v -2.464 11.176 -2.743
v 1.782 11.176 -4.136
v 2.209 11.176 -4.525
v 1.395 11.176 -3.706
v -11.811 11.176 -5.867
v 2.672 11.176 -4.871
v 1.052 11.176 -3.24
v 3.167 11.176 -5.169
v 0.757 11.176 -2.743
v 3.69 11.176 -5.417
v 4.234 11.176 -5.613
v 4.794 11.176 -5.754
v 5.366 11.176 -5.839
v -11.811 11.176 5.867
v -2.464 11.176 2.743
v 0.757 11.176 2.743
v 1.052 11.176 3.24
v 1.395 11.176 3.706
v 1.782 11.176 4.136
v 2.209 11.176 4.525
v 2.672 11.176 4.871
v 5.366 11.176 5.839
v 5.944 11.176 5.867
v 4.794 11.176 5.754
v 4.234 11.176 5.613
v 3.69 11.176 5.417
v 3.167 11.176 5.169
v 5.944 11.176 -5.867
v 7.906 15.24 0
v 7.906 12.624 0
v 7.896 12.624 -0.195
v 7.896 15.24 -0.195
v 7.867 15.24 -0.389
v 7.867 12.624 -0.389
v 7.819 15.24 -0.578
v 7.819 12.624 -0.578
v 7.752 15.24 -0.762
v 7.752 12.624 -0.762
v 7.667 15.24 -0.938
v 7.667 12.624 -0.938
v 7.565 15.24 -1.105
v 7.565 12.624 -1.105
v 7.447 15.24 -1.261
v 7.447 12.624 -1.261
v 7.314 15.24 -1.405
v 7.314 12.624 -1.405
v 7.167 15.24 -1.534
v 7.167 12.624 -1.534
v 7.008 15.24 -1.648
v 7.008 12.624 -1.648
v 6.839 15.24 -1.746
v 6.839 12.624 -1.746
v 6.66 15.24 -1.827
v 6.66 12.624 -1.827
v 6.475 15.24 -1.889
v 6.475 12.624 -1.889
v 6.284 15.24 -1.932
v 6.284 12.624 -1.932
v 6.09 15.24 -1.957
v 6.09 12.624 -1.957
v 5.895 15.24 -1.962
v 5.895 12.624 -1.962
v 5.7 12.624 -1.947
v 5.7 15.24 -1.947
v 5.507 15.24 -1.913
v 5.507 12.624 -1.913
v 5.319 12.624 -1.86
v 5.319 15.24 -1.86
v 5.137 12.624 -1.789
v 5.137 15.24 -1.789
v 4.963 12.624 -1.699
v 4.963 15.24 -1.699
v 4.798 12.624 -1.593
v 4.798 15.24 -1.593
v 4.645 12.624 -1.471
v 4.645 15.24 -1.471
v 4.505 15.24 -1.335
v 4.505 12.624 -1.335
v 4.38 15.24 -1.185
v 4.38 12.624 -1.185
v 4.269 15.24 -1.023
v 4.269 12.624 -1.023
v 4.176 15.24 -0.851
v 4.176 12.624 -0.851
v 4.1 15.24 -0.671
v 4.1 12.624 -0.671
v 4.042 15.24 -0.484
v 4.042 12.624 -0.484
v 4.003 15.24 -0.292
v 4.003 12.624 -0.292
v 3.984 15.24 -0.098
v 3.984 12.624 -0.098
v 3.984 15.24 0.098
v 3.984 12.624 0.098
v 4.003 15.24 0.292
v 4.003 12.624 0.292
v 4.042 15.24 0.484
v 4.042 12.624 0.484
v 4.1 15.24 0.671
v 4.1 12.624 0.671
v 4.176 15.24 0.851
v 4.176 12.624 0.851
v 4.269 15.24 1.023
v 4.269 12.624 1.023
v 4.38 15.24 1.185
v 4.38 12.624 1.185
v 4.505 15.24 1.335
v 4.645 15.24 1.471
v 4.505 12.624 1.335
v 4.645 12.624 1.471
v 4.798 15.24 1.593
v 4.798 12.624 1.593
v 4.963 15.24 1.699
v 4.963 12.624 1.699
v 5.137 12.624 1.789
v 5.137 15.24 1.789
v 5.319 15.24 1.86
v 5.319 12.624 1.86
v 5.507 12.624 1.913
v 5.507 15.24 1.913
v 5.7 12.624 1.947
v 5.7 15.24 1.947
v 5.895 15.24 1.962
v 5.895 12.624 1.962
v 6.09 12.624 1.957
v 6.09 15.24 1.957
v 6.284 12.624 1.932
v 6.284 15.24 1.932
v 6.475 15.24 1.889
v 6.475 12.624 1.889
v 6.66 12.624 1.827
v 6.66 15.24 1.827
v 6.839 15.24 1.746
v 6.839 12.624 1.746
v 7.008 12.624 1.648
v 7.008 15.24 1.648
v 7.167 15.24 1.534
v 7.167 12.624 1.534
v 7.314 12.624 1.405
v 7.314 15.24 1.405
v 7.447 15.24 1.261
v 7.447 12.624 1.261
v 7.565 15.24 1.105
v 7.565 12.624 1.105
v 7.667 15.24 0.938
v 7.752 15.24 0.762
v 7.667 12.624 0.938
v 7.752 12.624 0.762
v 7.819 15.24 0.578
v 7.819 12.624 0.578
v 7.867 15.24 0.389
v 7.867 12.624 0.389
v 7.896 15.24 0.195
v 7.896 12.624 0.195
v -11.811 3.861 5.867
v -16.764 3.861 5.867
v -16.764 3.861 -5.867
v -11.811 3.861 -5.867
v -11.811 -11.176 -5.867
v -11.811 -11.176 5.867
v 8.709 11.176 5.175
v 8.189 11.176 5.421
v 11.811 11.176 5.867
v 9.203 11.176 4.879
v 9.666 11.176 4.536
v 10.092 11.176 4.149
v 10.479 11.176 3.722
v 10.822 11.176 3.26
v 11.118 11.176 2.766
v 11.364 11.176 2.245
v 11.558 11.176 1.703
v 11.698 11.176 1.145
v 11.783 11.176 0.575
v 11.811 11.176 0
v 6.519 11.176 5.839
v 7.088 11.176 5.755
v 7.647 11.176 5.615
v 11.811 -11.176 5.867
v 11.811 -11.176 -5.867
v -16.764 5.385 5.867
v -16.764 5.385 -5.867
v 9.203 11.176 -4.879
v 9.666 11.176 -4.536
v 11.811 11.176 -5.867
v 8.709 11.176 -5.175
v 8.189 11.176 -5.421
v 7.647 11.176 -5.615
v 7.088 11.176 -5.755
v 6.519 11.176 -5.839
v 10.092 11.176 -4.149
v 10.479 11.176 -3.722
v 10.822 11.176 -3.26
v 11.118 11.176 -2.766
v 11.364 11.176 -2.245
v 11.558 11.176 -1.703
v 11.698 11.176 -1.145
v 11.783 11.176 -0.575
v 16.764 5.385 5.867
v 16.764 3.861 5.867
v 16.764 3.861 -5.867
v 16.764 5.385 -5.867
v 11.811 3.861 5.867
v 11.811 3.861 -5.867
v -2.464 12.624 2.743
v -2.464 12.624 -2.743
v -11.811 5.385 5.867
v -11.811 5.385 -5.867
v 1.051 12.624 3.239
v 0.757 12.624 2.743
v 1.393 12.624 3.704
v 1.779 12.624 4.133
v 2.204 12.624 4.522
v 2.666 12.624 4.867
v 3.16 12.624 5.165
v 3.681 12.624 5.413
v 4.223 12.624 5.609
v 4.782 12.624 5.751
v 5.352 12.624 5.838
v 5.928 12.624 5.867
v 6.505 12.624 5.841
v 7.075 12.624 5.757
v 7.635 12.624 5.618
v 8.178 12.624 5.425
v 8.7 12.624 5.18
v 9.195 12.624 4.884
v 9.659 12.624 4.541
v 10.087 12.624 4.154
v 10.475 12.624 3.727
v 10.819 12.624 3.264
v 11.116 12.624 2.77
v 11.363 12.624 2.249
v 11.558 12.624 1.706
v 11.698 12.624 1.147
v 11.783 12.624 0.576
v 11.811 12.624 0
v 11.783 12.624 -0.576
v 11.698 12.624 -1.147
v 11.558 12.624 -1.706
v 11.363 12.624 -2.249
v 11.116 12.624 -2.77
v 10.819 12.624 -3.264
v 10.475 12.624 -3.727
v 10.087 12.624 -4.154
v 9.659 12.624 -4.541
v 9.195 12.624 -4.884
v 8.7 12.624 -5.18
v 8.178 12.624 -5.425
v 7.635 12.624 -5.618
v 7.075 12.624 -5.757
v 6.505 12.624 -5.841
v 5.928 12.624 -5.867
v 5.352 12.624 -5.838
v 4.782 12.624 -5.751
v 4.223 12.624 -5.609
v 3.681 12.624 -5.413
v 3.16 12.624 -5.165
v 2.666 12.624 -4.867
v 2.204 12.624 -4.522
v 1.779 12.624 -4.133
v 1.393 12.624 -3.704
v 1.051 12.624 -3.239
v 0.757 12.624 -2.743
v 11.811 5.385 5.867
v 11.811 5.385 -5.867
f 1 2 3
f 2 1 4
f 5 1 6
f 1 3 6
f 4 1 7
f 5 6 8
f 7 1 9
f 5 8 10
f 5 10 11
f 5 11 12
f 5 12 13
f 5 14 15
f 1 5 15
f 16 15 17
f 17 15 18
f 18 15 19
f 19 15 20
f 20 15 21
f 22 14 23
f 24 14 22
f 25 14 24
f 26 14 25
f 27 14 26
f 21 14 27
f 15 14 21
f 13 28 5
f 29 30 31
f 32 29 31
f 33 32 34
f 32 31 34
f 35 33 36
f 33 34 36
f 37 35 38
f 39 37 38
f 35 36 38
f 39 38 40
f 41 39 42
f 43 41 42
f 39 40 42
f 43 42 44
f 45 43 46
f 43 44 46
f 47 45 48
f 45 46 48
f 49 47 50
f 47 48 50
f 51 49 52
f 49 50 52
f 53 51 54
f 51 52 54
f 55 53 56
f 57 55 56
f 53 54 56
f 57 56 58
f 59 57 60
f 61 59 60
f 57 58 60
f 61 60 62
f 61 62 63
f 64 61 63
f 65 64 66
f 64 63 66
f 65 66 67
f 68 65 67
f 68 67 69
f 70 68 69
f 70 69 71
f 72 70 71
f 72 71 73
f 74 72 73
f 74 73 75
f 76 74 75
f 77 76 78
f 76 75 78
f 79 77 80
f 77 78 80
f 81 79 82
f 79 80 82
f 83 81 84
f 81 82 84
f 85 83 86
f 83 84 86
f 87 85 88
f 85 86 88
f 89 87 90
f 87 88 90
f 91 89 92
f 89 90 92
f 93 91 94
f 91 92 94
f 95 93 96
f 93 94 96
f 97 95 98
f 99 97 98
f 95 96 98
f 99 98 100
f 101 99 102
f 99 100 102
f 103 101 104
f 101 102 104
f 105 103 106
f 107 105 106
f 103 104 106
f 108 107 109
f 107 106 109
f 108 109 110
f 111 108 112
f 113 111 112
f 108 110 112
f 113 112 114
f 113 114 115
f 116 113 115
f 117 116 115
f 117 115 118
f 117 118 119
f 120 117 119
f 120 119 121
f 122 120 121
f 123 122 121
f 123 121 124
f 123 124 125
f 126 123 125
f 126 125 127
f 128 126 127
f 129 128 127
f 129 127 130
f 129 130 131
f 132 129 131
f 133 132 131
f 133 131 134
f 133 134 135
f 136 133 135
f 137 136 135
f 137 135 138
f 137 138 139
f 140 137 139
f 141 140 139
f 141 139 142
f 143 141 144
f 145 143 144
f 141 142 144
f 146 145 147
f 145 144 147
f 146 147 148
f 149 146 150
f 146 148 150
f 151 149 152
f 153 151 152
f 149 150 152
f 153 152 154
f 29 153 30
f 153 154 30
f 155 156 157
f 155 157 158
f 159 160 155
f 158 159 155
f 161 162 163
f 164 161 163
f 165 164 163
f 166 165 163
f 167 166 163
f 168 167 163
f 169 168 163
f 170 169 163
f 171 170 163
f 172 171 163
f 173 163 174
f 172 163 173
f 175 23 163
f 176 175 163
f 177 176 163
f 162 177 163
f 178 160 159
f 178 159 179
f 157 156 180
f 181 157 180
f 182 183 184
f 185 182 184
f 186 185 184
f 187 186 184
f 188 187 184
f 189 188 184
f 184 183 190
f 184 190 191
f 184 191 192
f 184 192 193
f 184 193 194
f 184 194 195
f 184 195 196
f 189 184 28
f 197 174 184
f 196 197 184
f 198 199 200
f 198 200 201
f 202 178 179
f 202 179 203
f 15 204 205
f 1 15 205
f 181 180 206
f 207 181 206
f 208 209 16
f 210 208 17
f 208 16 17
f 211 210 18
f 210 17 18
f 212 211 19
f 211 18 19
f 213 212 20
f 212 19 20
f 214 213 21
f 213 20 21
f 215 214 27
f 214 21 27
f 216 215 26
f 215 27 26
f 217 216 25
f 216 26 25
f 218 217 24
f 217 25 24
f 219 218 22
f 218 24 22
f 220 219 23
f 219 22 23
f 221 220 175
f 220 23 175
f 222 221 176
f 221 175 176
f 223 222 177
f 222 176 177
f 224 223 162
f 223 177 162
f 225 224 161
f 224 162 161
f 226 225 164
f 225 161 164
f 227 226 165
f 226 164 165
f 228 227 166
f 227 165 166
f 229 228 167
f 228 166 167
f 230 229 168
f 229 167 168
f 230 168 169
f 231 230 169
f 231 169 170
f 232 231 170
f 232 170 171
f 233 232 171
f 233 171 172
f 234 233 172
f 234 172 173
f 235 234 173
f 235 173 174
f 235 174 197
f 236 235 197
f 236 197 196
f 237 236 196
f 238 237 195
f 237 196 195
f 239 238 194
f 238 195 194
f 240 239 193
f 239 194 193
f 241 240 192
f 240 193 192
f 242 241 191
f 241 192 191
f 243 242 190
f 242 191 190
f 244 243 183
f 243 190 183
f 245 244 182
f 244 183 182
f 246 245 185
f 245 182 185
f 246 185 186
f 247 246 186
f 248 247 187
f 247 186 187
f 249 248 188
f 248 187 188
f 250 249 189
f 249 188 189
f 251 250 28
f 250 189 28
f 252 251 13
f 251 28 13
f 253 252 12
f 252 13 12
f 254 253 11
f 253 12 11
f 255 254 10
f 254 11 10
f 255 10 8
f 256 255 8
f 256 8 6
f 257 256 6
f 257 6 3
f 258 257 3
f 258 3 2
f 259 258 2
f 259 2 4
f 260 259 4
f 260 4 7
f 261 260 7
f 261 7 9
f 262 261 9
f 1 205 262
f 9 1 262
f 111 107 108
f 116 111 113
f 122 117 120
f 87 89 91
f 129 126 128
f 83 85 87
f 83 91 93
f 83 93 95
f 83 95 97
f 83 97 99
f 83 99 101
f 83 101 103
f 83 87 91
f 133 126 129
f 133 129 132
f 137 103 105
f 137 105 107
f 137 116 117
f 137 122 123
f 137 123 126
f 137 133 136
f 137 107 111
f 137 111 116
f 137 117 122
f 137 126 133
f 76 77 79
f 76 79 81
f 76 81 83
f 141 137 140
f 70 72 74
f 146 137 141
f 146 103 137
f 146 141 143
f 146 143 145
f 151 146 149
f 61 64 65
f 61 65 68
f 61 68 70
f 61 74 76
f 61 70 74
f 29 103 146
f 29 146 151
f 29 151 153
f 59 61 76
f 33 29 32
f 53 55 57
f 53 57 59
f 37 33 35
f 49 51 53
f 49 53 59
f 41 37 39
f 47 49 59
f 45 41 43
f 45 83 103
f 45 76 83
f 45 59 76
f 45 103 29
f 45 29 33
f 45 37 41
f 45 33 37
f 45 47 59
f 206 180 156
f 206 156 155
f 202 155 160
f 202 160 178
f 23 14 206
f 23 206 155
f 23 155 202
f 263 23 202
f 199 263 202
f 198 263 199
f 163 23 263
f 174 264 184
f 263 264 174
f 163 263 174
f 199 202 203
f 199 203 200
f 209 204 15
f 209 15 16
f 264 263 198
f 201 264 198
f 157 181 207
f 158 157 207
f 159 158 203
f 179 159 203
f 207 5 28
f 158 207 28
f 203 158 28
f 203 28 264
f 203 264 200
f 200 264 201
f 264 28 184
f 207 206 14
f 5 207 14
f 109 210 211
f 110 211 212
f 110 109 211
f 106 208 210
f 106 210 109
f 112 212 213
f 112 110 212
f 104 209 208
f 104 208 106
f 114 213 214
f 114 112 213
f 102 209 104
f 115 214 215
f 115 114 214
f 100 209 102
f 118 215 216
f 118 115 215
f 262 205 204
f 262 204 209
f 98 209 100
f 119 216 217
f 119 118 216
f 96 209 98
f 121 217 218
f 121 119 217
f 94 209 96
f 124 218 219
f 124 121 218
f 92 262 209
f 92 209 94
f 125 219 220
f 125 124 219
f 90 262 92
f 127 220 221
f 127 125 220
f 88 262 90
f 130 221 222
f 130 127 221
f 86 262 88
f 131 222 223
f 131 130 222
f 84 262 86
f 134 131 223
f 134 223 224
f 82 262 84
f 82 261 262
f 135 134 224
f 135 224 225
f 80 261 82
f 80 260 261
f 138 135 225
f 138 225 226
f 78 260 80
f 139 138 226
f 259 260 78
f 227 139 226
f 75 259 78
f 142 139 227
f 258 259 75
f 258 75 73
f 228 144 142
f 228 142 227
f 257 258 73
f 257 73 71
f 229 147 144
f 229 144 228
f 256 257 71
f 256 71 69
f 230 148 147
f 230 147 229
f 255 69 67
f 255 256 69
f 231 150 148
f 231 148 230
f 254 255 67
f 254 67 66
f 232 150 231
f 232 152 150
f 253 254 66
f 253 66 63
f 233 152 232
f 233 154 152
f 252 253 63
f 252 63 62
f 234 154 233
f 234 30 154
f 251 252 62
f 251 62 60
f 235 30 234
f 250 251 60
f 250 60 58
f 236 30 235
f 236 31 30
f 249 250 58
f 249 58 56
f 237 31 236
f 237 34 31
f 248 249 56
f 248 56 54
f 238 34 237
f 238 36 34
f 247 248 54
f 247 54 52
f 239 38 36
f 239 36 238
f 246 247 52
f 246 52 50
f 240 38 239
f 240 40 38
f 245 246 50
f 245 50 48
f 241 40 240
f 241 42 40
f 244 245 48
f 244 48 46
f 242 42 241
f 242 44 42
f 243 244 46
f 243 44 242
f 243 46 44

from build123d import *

# Parameters (mm, degrees)
SKETCH1_W           = 23.622
SKETCH1_H           = 22.352
BOSS_EXTRUDE1_DEPTH = 5.8674
SKETCH3_W           = 4.953
SKETCH3_H           = 1.524
BOSS_EXTRUDE2_DEPTH = 11.7348
SKETCH4_R           = 5.8674
BOSS_EXTRUDE3_DEPTH = 1.4478
SKETCH5_R           = 1.96215
BOSS_EXTRUDE4_DEPTH = 2.6162
SKETCH6_W           = 3.220759804
SKETCH6_H           = 5.4864
BOSS_EXTRUDE5_DEPTH = 1.4478


with BuildPart() as part:
    # Sketch1 → Boss-Extrude1 (new body, symmetric)
    with BuildSketch(Plane.XY):
        Rectangle(SKETCH1_W, SKETCH1_H)
    extrude(amount=BOSS_EXTRUDE1_DEPTH, both=True)

    # Sketch3 → Boss-Extrude2 (add)
    with BuildSketch(Plane.XY.offset(5.8674)):
        with Locations((-14.2875, 4.6228)):
            Rectangle(SKETCH3_W, SKETCH3_H)
        with Locations((14.2875, 4.6228)):
            Rectangle(SKETCH3_W, SKETCH3_H)
    extrude(amount=-BOSS_EXTRUDE2_DEPTH)

    # Sketch4 → Boss-Extrude3 (add)
    with BuildSketch(Plane(origin=(0, 11.176, 0), x_dir=(1, 0, 0), z_dir=(0, 1, 0))):
        with Locations((5.9436, 0)):
            Circle(SKETCH4_R)
    extrude(amount=BOSS_EXTRUDE3_DEPTH)

    # Sketch5 → Boss-Extrude4 (add)
    with BuildSketch(Plane(origin=(0, 12.6238, 0), x_dir=(1, 0, 0), z_dir=(0, 1, 0))):
        with Locations((5.9436, 0)):
            Circle(SKETCH5_R)
    extrude(amount=BOSS_EXTRUDE4_DEPTH)

    # Sketch6 → Boss-Extrude5 (add)
    with BuildSketch(Plane(origin=(0, 12.6238, 0), x_dir=(1, 0, 0), z_dir=(0, 1, 0))):
        with Locations((-0.853420098, 0)):
            Rectangle(SKETCH6_W, SKETCH6_H)
    extrude(amount=-BOSS_EXTRUDE5_DEPTH)


solid = part.part
